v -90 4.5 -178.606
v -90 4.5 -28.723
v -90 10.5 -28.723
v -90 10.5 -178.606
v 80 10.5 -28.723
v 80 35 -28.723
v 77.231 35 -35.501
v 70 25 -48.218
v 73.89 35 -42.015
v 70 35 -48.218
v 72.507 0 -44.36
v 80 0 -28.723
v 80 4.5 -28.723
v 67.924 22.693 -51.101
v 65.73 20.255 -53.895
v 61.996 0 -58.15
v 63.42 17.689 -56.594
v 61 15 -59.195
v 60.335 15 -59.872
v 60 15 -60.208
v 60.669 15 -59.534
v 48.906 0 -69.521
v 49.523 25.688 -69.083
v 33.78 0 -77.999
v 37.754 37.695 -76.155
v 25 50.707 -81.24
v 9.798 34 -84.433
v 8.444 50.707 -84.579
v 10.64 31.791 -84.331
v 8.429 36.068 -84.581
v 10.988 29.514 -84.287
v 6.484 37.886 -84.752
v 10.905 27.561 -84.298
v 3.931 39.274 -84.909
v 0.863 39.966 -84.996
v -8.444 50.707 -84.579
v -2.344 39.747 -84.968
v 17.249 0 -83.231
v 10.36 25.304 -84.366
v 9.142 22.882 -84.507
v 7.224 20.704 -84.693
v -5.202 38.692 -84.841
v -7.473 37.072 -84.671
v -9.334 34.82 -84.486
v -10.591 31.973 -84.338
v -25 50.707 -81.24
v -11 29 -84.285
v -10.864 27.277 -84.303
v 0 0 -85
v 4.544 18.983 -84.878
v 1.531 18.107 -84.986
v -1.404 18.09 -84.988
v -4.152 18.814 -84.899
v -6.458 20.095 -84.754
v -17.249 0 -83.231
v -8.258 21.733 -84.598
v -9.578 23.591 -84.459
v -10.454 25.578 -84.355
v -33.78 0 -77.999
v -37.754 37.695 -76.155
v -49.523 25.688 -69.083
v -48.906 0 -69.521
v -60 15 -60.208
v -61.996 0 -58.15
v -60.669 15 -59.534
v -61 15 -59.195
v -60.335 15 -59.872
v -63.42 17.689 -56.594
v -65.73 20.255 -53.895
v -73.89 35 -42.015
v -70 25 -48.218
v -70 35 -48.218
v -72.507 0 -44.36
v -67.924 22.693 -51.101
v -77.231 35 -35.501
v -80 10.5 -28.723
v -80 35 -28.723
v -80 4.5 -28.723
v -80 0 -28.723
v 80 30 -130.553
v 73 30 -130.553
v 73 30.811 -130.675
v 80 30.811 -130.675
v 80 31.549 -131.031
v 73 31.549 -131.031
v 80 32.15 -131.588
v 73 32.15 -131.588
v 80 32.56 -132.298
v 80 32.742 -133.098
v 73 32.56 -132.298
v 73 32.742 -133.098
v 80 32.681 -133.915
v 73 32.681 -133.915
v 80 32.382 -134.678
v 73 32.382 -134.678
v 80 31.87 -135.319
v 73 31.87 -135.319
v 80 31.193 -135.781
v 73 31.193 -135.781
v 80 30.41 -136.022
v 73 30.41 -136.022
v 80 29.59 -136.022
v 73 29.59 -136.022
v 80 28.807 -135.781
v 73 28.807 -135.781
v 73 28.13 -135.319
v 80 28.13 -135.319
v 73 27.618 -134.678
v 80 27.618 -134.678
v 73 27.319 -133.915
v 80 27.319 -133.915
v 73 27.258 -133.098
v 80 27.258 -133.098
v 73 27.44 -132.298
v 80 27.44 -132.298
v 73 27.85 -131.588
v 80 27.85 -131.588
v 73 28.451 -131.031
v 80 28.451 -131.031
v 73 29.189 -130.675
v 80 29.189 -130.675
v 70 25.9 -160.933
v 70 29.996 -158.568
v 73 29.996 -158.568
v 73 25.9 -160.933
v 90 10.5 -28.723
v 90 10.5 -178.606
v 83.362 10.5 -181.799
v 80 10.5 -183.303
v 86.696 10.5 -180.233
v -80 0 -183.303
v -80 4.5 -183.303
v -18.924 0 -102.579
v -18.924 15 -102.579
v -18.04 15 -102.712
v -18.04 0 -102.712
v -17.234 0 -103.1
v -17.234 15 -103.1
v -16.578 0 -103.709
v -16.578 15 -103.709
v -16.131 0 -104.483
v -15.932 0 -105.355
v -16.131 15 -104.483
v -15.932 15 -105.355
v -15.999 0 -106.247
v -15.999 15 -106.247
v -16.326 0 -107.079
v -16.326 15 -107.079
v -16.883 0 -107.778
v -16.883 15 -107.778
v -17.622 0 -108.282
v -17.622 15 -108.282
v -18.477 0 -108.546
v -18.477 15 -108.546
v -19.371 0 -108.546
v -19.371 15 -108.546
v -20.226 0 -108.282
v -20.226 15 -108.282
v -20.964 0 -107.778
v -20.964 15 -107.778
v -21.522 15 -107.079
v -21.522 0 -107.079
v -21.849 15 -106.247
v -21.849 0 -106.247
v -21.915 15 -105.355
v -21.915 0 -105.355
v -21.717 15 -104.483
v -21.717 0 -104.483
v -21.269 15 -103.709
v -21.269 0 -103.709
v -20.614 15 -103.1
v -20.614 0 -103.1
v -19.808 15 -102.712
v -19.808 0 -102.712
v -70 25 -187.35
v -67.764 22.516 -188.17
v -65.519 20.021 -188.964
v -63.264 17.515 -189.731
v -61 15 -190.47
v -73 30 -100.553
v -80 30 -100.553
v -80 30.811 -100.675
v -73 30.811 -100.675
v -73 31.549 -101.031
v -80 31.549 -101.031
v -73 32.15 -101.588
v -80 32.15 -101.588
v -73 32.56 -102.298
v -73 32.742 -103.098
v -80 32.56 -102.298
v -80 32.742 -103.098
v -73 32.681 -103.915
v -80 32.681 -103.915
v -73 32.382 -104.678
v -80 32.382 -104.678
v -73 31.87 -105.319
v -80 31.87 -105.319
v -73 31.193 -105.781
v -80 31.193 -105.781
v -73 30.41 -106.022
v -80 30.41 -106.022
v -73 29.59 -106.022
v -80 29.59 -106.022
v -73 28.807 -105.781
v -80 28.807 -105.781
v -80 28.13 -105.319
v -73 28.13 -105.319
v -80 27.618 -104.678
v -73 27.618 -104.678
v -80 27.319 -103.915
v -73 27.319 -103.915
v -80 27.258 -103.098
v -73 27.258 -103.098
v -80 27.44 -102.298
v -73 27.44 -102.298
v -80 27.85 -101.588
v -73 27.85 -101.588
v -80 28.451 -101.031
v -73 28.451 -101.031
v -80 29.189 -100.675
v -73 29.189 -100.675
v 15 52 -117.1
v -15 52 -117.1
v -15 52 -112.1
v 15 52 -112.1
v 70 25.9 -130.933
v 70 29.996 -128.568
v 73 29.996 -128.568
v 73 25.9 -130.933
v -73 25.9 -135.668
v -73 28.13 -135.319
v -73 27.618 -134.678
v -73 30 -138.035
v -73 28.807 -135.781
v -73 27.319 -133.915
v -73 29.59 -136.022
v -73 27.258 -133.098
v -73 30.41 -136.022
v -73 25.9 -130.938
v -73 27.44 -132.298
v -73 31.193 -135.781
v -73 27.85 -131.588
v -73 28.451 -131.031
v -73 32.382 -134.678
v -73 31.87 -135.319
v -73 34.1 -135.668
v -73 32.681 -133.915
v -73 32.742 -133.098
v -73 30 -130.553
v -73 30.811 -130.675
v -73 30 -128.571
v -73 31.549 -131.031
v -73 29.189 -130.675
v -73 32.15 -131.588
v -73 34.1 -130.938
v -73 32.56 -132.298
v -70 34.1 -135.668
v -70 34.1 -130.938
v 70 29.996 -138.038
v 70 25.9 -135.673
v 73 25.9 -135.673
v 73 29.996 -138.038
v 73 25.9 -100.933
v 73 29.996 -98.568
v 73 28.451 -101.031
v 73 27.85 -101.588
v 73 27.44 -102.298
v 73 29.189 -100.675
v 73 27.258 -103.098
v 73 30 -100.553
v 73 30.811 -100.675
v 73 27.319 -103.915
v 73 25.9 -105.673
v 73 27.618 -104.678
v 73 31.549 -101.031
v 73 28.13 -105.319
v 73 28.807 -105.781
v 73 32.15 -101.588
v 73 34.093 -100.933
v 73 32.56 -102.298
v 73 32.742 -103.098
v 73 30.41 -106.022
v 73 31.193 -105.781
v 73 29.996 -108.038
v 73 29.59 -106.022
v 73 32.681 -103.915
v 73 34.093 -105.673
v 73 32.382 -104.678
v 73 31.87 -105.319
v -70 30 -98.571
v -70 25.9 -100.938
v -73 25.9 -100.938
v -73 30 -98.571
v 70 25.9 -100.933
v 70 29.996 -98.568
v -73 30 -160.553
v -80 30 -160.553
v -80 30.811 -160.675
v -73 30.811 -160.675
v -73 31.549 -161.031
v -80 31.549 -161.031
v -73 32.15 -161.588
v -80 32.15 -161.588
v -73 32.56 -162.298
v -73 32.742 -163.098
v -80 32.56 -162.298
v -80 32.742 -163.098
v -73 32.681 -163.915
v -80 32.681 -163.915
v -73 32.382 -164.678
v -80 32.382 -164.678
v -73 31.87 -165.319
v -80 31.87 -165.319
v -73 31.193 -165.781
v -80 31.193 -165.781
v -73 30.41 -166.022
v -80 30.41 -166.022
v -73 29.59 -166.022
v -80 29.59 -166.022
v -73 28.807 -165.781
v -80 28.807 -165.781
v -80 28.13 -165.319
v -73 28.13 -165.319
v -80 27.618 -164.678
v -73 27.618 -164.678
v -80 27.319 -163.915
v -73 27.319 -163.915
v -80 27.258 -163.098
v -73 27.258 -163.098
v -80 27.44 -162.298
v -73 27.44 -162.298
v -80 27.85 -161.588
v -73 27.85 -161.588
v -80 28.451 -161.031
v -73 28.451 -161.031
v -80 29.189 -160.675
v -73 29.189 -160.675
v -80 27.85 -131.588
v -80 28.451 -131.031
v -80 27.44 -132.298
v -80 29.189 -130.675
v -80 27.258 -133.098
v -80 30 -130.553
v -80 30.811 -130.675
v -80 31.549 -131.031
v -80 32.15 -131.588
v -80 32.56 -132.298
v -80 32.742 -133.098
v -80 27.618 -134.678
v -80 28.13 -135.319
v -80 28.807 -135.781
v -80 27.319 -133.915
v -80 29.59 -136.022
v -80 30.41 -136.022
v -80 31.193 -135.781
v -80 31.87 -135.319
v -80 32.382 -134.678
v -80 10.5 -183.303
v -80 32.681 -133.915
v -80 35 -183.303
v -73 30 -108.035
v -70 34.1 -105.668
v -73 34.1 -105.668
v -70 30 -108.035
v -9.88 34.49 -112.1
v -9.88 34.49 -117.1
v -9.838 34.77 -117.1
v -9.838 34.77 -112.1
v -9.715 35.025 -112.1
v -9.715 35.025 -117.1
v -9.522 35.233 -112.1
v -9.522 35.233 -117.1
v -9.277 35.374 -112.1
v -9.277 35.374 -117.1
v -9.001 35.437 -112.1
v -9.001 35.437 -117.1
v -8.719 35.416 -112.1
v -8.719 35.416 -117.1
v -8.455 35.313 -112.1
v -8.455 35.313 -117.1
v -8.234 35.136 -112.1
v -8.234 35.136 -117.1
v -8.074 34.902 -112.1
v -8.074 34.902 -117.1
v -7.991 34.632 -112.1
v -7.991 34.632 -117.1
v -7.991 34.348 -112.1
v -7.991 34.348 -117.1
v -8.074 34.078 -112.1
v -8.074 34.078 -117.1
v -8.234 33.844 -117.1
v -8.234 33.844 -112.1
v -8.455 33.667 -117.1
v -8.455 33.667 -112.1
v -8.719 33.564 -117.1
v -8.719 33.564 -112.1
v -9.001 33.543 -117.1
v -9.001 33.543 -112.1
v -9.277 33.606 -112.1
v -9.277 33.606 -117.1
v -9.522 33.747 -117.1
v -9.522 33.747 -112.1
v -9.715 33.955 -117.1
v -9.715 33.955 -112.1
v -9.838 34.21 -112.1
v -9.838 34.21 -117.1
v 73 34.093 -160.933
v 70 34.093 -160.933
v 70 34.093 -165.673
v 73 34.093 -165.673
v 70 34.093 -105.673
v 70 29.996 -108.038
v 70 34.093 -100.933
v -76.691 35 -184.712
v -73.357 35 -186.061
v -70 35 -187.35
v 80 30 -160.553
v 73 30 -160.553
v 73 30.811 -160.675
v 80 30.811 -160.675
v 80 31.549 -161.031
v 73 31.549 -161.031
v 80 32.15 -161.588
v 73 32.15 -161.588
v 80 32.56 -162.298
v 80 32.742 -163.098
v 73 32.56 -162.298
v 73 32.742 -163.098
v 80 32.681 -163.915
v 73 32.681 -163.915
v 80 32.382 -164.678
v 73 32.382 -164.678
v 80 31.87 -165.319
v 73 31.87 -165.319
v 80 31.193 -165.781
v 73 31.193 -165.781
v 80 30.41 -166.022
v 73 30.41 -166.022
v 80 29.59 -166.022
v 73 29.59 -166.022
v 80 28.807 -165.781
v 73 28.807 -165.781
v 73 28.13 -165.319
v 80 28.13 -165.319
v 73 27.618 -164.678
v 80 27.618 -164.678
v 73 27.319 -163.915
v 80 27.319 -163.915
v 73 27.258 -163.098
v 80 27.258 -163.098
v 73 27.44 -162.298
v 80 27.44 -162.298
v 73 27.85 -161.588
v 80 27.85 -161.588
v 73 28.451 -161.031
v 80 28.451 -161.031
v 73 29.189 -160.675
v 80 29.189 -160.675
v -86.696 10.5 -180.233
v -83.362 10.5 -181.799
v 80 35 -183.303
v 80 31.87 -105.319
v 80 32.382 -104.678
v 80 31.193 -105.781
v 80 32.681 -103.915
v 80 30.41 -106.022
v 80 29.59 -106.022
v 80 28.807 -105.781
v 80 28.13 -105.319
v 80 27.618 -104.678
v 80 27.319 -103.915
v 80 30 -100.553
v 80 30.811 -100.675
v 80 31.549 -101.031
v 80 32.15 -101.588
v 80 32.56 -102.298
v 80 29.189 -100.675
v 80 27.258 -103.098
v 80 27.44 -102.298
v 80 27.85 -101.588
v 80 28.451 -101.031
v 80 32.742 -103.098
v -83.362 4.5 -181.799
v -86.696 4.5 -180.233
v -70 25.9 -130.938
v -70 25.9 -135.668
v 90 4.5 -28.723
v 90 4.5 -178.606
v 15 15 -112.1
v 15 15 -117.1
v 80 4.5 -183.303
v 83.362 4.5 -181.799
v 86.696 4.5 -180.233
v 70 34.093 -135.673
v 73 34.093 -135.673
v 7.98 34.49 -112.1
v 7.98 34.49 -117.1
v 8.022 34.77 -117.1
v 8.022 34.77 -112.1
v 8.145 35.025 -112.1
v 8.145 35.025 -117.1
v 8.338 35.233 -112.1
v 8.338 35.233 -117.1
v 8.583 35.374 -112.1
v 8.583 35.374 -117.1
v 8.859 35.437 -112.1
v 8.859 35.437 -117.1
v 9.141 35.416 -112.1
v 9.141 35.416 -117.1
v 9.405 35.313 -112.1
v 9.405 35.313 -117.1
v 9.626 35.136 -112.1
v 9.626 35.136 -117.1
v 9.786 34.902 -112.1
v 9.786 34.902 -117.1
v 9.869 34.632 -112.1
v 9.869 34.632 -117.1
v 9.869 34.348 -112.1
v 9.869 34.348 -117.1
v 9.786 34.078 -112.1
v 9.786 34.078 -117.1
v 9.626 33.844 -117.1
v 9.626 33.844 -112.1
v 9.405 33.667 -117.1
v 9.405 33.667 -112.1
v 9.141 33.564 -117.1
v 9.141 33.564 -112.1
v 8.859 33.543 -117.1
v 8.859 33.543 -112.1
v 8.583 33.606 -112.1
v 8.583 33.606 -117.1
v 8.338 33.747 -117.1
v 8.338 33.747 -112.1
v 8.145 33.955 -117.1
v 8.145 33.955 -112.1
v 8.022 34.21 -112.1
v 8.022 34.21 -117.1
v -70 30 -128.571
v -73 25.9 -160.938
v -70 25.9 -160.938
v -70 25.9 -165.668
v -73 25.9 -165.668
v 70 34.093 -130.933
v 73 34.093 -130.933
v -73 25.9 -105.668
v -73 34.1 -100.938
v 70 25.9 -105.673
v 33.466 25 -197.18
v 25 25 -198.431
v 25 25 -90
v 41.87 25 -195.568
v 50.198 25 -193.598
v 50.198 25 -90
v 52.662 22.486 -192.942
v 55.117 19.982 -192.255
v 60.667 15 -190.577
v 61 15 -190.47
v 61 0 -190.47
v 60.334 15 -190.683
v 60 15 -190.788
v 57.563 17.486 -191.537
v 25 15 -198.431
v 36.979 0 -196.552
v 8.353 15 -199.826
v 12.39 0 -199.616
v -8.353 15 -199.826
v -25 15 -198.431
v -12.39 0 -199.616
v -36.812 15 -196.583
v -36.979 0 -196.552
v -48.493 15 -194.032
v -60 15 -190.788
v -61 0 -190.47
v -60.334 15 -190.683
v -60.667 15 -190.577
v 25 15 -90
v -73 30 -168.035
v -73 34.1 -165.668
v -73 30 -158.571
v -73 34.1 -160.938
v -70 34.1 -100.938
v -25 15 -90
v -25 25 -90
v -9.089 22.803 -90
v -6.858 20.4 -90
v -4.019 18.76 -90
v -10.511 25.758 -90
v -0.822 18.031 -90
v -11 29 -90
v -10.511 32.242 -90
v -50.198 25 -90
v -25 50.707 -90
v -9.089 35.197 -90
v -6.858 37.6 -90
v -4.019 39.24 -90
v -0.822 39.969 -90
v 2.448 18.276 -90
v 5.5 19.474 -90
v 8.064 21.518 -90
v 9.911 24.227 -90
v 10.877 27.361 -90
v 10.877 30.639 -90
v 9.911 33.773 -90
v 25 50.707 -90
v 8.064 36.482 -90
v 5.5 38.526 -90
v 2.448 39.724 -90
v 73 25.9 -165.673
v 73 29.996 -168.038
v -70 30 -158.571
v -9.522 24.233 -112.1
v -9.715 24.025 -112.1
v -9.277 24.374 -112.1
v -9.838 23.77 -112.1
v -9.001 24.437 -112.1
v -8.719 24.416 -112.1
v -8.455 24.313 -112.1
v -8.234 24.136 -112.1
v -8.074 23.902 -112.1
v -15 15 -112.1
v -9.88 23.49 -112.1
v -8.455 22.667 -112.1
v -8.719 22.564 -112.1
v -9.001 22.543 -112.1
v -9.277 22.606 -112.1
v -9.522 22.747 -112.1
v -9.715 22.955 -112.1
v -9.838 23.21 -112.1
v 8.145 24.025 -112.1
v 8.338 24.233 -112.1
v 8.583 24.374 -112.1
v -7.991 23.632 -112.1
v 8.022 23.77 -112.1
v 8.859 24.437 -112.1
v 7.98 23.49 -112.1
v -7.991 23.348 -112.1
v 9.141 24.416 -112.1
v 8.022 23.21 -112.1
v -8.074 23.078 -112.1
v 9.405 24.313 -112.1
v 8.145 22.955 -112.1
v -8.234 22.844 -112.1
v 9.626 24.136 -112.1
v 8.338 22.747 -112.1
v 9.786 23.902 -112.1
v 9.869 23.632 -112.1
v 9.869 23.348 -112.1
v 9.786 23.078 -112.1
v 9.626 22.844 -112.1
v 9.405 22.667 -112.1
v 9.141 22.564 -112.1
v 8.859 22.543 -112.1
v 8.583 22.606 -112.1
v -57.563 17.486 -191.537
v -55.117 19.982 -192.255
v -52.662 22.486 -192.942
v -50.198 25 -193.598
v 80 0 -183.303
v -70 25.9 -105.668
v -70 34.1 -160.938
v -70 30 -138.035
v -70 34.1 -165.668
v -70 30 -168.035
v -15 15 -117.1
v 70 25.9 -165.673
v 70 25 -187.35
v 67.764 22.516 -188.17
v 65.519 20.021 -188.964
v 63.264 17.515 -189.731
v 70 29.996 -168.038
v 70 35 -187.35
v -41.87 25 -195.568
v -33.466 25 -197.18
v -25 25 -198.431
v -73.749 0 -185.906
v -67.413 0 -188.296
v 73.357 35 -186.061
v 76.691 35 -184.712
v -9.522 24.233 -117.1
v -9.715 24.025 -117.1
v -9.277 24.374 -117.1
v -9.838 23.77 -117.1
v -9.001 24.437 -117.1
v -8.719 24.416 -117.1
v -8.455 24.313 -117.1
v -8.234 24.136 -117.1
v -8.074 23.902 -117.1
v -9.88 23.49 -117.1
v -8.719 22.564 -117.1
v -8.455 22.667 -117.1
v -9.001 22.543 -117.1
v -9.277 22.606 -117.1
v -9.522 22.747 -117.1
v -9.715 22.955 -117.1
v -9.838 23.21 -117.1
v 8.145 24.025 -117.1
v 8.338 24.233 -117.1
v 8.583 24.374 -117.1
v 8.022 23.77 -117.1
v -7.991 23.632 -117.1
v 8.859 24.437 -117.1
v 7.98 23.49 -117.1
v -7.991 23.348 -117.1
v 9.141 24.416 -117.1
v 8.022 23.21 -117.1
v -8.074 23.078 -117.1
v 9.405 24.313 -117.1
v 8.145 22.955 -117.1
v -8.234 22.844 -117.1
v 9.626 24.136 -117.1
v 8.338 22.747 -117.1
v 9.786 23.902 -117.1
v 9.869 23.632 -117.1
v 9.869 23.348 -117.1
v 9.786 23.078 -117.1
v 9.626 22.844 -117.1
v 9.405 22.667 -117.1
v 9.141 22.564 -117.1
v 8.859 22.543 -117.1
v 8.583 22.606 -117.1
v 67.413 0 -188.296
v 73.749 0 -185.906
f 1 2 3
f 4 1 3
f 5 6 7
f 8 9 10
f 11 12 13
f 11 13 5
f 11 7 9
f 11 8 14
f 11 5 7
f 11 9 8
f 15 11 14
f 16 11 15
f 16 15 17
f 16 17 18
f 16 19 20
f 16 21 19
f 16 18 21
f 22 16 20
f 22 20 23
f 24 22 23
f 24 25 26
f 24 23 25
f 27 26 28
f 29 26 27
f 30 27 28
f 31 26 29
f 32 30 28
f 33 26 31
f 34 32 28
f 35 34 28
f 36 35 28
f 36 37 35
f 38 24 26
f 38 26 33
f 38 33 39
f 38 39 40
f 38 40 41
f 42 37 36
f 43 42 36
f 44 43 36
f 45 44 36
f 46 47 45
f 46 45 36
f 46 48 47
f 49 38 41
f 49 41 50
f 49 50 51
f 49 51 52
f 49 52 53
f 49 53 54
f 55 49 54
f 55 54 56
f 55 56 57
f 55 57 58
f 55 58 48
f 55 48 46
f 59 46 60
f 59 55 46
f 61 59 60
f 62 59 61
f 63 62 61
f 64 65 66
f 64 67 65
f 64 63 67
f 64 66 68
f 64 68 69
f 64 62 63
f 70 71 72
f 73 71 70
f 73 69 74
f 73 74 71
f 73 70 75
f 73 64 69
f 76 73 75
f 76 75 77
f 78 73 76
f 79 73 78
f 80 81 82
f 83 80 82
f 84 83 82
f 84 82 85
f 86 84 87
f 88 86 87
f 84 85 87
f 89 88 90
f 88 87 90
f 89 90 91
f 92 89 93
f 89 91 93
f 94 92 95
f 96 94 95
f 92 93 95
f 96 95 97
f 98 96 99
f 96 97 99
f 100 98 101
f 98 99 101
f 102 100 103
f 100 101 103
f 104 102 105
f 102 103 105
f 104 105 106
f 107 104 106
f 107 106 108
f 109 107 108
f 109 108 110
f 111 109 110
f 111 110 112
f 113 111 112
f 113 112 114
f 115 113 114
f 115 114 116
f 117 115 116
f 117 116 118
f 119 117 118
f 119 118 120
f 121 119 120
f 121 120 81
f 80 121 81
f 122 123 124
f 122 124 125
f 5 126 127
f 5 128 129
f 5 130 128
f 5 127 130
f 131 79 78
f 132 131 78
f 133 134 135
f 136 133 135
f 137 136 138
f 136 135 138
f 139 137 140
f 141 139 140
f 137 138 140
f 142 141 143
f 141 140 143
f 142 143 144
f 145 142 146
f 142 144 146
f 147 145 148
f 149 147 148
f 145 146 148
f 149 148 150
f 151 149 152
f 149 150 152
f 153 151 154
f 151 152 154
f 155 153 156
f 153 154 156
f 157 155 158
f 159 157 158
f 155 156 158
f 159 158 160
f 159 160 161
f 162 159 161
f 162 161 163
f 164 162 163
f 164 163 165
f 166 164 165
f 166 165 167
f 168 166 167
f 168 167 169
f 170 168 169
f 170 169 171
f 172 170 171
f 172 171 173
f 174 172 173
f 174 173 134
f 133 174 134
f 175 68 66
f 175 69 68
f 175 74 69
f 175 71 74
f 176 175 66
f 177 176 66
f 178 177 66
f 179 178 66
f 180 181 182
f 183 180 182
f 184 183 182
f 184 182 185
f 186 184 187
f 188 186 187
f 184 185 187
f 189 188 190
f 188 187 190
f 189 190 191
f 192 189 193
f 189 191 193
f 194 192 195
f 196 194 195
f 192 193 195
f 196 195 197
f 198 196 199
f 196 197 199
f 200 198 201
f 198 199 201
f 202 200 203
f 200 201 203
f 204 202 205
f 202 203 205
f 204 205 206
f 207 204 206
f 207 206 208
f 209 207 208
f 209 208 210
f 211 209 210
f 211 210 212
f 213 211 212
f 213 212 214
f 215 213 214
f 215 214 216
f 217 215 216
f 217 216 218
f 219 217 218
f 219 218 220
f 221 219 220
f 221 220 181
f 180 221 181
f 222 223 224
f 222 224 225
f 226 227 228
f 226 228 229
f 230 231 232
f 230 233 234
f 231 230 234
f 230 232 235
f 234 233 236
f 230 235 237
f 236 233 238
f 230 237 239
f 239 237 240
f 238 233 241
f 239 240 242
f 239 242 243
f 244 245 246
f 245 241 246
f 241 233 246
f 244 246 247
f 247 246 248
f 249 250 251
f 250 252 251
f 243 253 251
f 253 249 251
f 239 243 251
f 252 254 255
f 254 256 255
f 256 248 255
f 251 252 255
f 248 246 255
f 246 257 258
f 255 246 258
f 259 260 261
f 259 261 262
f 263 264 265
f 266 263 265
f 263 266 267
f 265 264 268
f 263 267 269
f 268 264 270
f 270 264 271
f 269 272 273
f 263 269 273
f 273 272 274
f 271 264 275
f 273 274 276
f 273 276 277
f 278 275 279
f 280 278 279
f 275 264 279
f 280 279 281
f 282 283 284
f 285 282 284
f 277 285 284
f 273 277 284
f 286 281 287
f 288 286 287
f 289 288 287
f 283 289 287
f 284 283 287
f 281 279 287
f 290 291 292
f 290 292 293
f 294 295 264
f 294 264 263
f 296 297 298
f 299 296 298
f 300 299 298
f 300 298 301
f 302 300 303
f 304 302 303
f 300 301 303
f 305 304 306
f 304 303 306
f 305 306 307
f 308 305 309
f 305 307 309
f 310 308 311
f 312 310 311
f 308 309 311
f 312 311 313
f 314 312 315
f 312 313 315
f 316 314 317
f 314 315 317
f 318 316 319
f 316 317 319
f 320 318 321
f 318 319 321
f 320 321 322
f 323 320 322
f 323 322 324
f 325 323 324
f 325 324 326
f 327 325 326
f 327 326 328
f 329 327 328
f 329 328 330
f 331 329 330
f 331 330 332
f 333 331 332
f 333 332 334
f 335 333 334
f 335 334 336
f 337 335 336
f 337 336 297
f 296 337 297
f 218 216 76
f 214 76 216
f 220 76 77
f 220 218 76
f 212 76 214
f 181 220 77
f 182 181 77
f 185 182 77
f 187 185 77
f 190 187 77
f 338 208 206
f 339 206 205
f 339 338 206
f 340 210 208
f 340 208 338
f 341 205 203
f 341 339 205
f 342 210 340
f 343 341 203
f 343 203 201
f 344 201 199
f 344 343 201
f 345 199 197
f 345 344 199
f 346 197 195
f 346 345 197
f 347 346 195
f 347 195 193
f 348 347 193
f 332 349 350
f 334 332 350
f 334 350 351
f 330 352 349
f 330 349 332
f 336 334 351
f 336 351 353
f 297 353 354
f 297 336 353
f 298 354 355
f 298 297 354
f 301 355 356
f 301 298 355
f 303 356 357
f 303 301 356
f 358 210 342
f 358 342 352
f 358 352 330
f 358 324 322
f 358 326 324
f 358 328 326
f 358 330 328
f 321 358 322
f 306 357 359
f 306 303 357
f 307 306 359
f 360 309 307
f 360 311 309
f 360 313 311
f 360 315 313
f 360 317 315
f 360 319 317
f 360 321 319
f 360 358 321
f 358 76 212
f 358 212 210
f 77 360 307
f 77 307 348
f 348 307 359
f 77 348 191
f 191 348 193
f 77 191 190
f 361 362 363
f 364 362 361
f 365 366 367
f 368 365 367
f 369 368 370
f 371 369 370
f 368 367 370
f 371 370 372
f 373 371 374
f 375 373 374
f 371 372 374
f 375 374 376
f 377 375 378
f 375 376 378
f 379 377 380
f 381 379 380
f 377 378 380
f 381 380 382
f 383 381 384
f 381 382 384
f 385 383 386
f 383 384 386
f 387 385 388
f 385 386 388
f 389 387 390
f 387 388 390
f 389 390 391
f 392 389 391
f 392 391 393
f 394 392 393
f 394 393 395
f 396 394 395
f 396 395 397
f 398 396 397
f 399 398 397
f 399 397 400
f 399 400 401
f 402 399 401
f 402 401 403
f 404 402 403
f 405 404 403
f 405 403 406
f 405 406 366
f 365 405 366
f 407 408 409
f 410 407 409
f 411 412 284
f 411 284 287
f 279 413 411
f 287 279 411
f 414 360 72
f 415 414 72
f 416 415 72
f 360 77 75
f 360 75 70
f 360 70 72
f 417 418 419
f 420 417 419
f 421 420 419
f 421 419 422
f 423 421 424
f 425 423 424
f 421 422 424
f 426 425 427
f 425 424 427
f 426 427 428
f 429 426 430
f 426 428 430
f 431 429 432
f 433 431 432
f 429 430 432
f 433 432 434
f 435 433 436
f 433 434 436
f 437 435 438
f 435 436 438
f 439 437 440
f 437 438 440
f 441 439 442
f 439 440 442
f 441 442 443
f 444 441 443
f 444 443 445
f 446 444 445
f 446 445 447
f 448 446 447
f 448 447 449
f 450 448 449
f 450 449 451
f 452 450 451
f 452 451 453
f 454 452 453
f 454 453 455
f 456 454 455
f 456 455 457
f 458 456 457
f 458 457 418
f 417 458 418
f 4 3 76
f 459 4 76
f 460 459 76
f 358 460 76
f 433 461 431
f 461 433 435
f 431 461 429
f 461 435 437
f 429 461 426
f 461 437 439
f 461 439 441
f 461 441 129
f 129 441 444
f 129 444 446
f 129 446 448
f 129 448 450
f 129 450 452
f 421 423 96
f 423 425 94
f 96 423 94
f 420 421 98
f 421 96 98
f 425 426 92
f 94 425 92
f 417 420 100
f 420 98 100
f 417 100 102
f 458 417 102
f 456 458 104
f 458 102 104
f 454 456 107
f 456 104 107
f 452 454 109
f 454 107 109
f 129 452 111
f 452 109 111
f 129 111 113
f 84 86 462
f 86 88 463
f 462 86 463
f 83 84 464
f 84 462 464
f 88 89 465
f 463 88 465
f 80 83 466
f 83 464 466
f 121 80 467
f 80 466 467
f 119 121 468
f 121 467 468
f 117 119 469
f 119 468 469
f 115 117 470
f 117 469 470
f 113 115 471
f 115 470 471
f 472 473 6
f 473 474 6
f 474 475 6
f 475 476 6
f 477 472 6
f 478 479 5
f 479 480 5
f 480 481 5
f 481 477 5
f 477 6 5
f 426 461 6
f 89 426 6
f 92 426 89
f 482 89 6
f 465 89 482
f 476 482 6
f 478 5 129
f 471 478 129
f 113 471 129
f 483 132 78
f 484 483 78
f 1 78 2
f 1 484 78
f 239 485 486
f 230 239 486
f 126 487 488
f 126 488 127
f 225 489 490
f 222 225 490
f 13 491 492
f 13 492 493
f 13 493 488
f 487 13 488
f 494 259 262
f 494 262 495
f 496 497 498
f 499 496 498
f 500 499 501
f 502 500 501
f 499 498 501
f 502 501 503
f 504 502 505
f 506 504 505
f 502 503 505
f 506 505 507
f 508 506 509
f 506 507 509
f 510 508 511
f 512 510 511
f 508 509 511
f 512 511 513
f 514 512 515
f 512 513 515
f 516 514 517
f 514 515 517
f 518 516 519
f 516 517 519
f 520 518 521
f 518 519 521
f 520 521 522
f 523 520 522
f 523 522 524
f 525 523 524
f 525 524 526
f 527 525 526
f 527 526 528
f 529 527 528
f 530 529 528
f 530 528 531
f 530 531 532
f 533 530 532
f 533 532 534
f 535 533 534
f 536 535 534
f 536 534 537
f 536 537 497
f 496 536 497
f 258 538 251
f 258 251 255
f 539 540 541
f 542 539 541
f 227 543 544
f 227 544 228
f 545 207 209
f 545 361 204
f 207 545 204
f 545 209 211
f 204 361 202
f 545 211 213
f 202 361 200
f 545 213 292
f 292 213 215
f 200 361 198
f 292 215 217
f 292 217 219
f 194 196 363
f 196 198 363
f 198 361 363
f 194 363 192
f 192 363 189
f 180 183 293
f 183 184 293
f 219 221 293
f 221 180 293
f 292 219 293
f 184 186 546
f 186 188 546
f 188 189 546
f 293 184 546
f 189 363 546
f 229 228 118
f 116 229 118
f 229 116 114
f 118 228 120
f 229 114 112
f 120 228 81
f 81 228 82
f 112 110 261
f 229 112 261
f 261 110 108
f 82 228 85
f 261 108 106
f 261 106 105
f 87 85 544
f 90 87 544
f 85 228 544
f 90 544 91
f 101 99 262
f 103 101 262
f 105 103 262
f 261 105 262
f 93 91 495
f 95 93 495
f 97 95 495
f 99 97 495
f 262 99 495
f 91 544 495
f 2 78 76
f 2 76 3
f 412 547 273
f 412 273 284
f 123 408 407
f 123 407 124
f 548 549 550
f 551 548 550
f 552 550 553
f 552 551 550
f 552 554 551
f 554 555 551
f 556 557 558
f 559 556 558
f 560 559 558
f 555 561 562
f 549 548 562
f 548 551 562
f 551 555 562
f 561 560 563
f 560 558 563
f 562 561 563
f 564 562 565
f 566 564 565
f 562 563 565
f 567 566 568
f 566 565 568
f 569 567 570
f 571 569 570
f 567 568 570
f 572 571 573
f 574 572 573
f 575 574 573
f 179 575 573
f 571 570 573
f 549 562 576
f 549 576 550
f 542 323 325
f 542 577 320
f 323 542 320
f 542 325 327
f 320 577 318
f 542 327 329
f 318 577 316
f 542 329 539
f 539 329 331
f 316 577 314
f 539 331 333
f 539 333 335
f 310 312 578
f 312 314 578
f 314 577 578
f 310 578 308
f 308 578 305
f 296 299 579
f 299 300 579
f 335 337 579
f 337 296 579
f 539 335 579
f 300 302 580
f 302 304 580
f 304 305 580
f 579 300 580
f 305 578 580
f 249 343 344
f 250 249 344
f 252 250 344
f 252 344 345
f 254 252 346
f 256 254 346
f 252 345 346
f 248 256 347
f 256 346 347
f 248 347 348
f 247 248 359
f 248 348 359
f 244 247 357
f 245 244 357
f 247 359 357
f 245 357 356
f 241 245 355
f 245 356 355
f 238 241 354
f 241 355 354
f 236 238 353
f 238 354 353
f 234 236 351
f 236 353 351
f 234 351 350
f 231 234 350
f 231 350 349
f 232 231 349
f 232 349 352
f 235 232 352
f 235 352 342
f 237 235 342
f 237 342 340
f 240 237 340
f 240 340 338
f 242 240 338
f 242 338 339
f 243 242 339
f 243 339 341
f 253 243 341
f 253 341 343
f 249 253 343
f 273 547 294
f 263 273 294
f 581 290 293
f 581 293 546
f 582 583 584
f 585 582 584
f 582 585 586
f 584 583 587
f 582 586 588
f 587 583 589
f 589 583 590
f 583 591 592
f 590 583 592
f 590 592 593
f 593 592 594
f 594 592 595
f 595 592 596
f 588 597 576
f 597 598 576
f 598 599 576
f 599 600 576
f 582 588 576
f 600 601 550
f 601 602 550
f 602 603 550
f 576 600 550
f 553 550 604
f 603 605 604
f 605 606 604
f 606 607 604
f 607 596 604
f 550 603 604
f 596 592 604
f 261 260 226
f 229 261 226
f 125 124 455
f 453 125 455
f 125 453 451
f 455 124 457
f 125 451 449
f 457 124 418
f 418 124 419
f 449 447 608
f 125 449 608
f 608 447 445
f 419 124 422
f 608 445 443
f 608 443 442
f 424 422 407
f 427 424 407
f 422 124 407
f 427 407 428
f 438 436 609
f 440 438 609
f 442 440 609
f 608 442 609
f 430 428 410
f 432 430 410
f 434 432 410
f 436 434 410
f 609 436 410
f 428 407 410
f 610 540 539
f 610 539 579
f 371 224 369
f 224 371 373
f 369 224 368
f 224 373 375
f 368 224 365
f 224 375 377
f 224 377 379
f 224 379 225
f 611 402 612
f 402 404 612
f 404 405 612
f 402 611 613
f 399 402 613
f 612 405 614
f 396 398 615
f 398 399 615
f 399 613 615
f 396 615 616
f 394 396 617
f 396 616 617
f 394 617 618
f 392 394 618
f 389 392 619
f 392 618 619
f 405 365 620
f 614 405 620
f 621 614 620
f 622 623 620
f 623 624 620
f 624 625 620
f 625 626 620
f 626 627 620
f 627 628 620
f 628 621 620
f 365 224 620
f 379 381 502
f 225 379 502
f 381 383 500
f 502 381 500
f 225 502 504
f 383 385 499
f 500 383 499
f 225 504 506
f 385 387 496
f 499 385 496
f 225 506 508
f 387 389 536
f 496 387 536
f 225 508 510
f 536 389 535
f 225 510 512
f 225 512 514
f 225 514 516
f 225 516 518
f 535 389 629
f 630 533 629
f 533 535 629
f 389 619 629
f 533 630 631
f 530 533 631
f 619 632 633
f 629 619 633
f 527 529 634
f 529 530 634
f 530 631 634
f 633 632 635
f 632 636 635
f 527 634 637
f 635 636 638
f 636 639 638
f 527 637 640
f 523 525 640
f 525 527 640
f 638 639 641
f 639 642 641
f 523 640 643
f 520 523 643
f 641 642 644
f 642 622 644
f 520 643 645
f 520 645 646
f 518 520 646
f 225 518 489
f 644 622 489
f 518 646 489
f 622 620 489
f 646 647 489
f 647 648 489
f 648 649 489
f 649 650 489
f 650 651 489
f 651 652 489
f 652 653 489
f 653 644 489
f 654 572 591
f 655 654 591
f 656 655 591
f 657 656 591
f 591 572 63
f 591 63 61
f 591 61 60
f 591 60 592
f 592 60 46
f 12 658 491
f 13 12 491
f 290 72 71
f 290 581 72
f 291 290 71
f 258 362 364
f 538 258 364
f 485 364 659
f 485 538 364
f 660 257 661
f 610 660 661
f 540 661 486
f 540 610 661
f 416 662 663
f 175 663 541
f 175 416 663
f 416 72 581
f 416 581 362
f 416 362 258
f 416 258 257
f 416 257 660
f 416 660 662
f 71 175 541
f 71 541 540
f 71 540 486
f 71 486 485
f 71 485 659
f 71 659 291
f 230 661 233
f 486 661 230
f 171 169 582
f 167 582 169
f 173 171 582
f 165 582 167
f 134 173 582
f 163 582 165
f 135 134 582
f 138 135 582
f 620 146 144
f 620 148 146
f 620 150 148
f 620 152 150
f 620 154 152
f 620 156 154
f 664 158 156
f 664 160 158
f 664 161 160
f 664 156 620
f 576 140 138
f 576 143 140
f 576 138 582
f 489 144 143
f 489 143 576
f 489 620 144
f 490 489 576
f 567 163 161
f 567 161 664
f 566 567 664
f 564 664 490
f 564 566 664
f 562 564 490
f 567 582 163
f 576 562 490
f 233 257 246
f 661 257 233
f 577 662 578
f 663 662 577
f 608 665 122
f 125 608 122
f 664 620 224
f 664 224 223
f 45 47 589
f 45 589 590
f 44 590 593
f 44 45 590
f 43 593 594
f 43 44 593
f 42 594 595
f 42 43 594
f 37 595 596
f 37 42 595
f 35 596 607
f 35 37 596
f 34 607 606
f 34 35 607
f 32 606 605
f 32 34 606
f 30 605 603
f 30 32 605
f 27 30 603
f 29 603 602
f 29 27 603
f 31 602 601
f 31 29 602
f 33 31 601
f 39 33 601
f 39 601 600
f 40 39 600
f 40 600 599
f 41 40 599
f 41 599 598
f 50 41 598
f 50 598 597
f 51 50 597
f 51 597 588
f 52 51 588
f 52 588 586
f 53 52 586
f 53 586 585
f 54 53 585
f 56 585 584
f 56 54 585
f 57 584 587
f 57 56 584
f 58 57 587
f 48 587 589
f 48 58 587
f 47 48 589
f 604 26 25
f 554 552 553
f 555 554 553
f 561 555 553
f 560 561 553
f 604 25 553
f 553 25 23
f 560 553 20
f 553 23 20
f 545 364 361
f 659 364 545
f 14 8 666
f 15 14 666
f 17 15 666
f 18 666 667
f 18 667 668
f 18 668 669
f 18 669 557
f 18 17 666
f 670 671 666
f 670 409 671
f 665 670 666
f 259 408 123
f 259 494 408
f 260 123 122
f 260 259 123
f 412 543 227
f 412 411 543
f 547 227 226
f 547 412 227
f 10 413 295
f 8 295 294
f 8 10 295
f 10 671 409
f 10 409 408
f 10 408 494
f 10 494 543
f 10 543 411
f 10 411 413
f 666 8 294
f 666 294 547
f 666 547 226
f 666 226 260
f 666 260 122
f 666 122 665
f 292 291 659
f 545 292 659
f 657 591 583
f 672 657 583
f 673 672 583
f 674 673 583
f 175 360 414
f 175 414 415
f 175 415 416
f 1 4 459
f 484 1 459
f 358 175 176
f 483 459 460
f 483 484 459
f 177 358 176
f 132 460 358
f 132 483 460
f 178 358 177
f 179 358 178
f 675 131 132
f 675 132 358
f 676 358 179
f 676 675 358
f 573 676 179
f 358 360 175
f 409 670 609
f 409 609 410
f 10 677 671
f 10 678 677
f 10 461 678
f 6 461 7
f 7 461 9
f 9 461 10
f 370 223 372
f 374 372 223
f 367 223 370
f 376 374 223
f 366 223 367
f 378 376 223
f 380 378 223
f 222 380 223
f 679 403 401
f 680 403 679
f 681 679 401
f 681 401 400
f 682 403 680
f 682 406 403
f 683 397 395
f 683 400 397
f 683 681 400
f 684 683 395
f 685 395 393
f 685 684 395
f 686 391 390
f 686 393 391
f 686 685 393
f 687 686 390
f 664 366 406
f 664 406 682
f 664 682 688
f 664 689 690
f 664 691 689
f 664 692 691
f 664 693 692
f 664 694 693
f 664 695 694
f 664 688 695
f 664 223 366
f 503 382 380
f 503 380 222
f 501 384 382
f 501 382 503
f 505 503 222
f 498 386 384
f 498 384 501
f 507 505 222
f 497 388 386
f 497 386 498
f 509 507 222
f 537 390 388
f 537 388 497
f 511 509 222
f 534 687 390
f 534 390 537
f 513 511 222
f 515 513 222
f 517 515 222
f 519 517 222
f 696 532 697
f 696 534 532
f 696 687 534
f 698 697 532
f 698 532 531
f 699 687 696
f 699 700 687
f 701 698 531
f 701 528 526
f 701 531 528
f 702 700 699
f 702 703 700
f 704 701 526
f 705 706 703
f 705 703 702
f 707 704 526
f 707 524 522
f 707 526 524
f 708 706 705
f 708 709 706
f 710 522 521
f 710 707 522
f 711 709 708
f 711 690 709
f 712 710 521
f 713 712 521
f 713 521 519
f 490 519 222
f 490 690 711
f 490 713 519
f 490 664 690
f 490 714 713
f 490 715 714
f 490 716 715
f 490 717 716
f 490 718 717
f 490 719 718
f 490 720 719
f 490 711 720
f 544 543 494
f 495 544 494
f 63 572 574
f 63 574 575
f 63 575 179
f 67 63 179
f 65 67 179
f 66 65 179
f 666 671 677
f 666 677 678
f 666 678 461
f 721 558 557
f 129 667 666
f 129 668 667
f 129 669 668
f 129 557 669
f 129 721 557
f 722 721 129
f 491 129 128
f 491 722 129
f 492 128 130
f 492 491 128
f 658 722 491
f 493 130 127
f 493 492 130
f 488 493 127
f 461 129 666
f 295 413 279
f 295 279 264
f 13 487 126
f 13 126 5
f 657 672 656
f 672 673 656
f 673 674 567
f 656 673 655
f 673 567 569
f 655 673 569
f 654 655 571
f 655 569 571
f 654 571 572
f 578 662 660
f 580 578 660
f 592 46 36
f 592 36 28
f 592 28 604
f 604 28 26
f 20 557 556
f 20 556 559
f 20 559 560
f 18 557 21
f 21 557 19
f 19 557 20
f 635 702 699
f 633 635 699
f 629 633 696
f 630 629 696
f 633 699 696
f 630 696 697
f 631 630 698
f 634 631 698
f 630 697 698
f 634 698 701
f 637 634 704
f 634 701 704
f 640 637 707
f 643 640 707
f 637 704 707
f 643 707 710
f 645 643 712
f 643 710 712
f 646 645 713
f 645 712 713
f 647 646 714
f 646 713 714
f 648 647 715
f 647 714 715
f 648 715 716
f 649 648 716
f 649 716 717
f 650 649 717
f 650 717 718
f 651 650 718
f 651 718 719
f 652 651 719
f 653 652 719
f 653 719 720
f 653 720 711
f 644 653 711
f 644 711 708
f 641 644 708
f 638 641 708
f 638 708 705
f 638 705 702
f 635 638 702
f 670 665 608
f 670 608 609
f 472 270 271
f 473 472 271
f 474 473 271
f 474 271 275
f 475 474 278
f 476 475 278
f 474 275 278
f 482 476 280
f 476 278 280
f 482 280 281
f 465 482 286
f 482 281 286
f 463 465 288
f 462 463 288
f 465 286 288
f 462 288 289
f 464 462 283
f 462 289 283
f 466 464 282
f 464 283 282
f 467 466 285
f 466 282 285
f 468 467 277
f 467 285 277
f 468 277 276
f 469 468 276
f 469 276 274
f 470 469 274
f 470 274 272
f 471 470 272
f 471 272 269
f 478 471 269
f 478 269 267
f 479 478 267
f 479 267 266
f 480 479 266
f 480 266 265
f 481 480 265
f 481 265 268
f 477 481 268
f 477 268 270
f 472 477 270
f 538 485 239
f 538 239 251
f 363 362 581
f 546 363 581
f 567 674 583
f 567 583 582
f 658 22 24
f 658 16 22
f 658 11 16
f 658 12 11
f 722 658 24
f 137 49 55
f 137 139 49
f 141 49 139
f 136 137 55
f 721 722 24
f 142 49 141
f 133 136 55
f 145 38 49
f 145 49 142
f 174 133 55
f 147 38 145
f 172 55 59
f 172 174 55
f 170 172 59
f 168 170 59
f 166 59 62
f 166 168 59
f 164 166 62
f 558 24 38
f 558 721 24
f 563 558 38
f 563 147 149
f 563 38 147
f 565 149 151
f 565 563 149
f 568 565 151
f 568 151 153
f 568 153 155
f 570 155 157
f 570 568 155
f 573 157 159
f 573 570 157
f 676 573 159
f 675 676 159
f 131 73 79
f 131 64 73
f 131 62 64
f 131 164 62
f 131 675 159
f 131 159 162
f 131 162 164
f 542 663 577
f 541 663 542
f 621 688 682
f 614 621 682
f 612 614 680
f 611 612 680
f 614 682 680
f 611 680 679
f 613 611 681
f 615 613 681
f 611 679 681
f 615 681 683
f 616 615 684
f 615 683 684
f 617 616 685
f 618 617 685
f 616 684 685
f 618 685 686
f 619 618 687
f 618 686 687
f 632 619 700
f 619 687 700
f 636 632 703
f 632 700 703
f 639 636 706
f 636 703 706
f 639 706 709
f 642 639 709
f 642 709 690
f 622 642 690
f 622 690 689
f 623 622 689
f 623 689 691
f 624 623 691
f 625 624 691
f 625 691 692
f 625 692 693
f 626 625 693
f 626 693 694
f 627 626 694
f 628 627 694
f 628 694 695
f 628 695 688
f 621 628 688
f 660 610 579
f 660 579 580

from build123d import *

# Parameters (mm, degrees)
SKETCH1_R                = 200
BOSS_EXTRUDE1_DEPTH      = 15
BOSS_EXTRUDE2_DEPTH      = 200
CUT_EXTRUDE1_DEPTH       = 286.087705803
CUT_EXTRUDE1_DEPTH_BACK  = 286.087705803
SKETCH3_R                = 85
CUT_EXTRUDE2_DEPTH       = 451.079120005
CUT_EXTRUDE2_DEPTH_BACK  = 451.079120005
SKETCH4_R                = 11
CUT_EXTRUDE3_DEPTH       = 451.079120105
CUT_EXTRUDE3_DEPTH_BACK  = 110
CUT_EXTRUDE4_DEPTH       = 110
BOSS_EXTRUDE3_DEPTH      = 200
CUT_EXTRUDE5_DEPTH       = 286.087705815
CUT_EXTRUDE5_DEPTH_BACK  = 286.087705815
SKETCH7_OUTSIDE_W        = 515.59
SKETCH7_OUTSIDE_H        = 515.59
SKETCH7_OUTSIDE_R        = 200
SKETCH9_R                = 4
BOSS_EXTRUDE4_DEPTH      = 220
CUT_EXTRUDE6_DEPTH       = 190
SKETCH11_R               = 3
CUT_EXTRUDE7_DEPTH       = 486.974499745
CUT_EXTRUDE8_DEPTH       = 302.61434707
CUT_EXTRUDE8_DEPTH_BACK  = 302.61434707
BOSS_EXTRUDE5_DEPTH      = 150
CUT_EXTRUDE9_DEPTH       = 262.287608345
CUT_EXTRUDE9_DEPTH_BACK  = 262.287608345
CUT_EXTRUDE10_DEPTH      = 259.795285906
CUT_EXTRUDE10_DEPTH_BACK = 259.795285906
SKETCH18_R               = 85
CUT_EXTRUDE11_START      = -15
CUT_EXTRUDE11_DEPTH      = 35
SKETCH20_R               = 2.75
CUT_EXTRUDE12_DEPTH      = 268.341007469
SKETCH21_W               = 30
SKETCH21_H               = 5
BOSS_EXTRUDE6_DEPTH      = 37
SKETCH22_R               = 0.95
CUT_EXTRUDE13_DEPTH      = 10
CUT_EXTRUDE14_DEPTH      = 3
LPATTERN1_COUNT          = 3
LPATTERN1_PITCH          = 30
CUT_EXTRUDE15_DEPTH      = 3
LPATTERN2_COUNT          = 3
LPATTERN2_PITCH          = 30
SKETCH25_R               = 3
CUT_EXTRUDE16_DEPTH      = 30


# Read off the part's stored shape, not the designer's step: Cut-Extrude11
with BuildPart() as part:
    # Sketch1 → Boss-Extrude1 (new body)
    with BuildSketch(Plane(origin=(0, 0, 0), x_dir=(1, 0, 0), z_dir=(0, 1, 0))):
        with Locations(Location((0, 0, 0), (0, 0, 270))):
            Circle(SKETCH1_R)
    extrude(amount=BOSS_EXTRUDE1_DEPTH)

    # Sketch2 → Boss-Extrude2 (add, symmetric)
    with BuildSketch(Plane.XY):
        Polygon((-25, 50.707142143), (25, 50.707142143), (60, 15), (-60, 15), align=None)
    extrude(amount=BOSS_EXTRUDE2_DEPTH, both=True)

    # Sketch3 → Cut-Extrude1 (cut, two sides: drawn at the far end of the back side and taken through both)
    with BuildSketch(Plane(origin=(0, 15, 0), x_dir=(1, 0, 0), z_dir=(0, 1, 0)).offset(-CUT_EXTRUDE1_DEPTH_BACK)):
        with Locations(Location((0, 0, 0), (0, 0, 270))):
            Circle(SKETCH3_R)
    extrude(amount=CUT_EXTRUDE1_DEPTH + CUT_EXTRUDE1_DEPTH_BACK, mode=Mode.SUBTRACT)

    # Sketch4 → Cut-Extrude2 (cut, two sides: drawn at the far end of the back side and taken through both)
    with BuildSketch(Plane(origin=(0, 0, -200), x_dir=(-1, 0, 0), z_dir=(0, 0, -1)).offset(-CUT_EXTRUDE2_DEPTH_BACK)):
        with Locations((0, 29)):
            Circle(SKETCH4_R)
    extrude(amount=CUT_EXTRUDE2_DEPTH + CUT_EXTRUDE2_DEPTH_BACK, mode=Mode.SUBTRACT)

    # Sketch5 → Cut-Extrude3 (cut, two sides: drawn at the far end of the back side and taken through both)
    with BuildSketch(Plane.XY.offset(200).offset(-CUT_EXTRUDE3_DEPTH_BACK)):
        Polygon((-25, 50.707142143), (25, 50.707142143), (50.198039412, 25), (25, 25), (25, 15), (-25, 15), (-25, 25), (-50.198039412, 25), align=None)
    extrude(amount=CUT_EXTRUDE3_DEPTH + CUT_EXTRUDE3_DEPTH_BACK, mode=Mode.SUBTRACT)

    # Sketch6 → Cut-Extrude4 (cut)
    with BuildSketch(Plane(origin=(0, 0, -200), x_dir=(-1, 0, 0), z_dir=(0, 0, -1))):
        Polygon((-25, 50.707142143), (25, 50.707142143), (50.198039412, 25), (25, 25), (25, 15), (-25, 15), (-25, 25), (-50.198039412, 25), align=None)
    extrude(amount=-CUT_EXTRUDE4_DEPTH, mode=Mode.SUBTRACT)

    # Sketch8 → Boss-Extrude3 (add, symmetric)
    with BuildSketch(Plane(origin=(0, 0, 0), x_dir=(0, 0, -1), z_dir=(1, 0, 0))):
        Polygon((0, 15), (-20, 15), (-10, 35.712315177), (10, 35.712315177), (20, 15), align=None)
    extrude(amount=BOSS_EXTRUDE3_DEPTH, both=True)

    # Sketch7 outside → Cut-Extrude5 (cut, two sides: drawn at the far end of the back side and taken through both)
    with BuildSketch(Plane(origin=(0, 15, 0), x_dir=(1, 0, 0), z_dir=(0, 1, 0)).offset(-CUT_EXTRUDE5_DEPTH_BACK)):
        Rectangle(SKETCH7_OUTSIDE_W, SKETCH7_OUTSIDE_H)
        with Locations(Location((0, 0, 0), (0, 0, 97.180755781))):
            Circle(SKETCH7_OUTSIDE_R, mode=Mode.SUBTRACT)
    extrude(amount=CUT_EXTRUDE5_DEPTH + CUT_EXTRUDE5_DEPTH_BACK, mode=Mode.SUBTRACT)

    # Sketch9 → Boss-Extrude4 (add, symmetric)
    with BuildSketch(Plane(origin=(0, 0, 0), x_dir=(0, 0, -1), z_dir=(1, 0, 0))):
        with Locations(Location((0, 29, 0), (0, 0, 180))):
            Circle(SKETCH9_R)
    extrude(amount=BOSS_EXTRUDE4_DEPTH, both=True)

    # Sketch10 → Cut-Extrude6 (cut, symmetric)
    with BuildSketch(Plane(origin=(0, 0, 0), x_dir=(0, 0, -1), z_dir=(1, 0, 0))):
        Polygon((-20, 15), (20, 15), (10, 35.712315177), (-10, 35.712315177), align=None)
    extrude(amount=CUT_EXTRUDE6_DEPTH, both=True, mode=Mode.SUBTRACT)

    # Sketch11 → Cut-Extrude7 (cut, through all)
    with BuildSketch(Plane.ZY.offset(220)):
        with Locations((0, 29)):
            Circle(SKETCH11_R)
    extrude(amount=-CUT_EXTRUDE7_DEPTH, mode=Mode.SUBTRACT)

    # Sketch14 → Cut-Extrude8 (cut, two sides: drawn at the far end of the back side and taken through both)
    with BuildSketch(Plane(origin=(0, 0, 0), x_dir=(1, 0, 0), z_dir=(0, 1, 0)).offset(-CUT_EXTRUDE8_DEPTH_BACK)):
        Polygon((-80, 28.722813233), (-80, 204.683452683), (-270.013244013, 28.722813233), (-103.583737584, -216.10995611), (187.046893047, -216.10995611), (266.535612536, 150.034958035), (80, 209.154693155), (80, 28.722813233), align=None)
    extrude(amount=CUT_EXTRUDE8_DEPTH + CUT_EXTRUDE8_DEPTH_BACK, mode=Mode.SUBTRACT)

    # Sketch16 → Boss-Extrude5 (add, symmetric)
    with BuildSketch(Plane(origin=(0, 0, -90), x_dir=(-1, 0, 0), z_dir=(0, 0, -1))):
        Polygon((-80, 15), (-80, 35), (-70, 35), (-70, 25), (-61, 15), (-61, 0), (-80, 0), (-80, 4.5), (-90, 4.5), (-90, 10.5), (-80, 10.5), align=None)
        Polygon((80, 15), (80, 35), (70, 35), (70, 25), (61, 15), (61, 0), (80, 0), (80, 4.5), (90, 4.5), (90, 10.5), (80, 10.5), align=None)
    extrude(amount=BOSS_EXTRUDE5_DEPTH, both=True)

    # Sketch17 → Cut-Extrude9 (cut, two sides: drawn at the far end of the back side and taken through both)
    with BuildSketch(Plane(origin=(0, 0, 0), x_dir=(1, 0, 0), z_dir=(0, 1, 0)).offset(-CUT_EXTRUDE9_DEPTH_BACK)):
        Polygon((-80, 28.722813233), (-99.608008808, 28.722813233), (-99.608008808, -74.271563426), (112.245925984, -74.271563426), (112.245925984, 0), (109.222119936, 28.722813233), (80, 28.722813233), align=None)
    extrude(amount=CUT_EXTRUDE9_DEPTH + CUT_EXTRUDE9_DEPTH_BACK, mode=Mode.SUBTRACT)

    # Sketch18 → Cut-Extrude10 (cut, two sides: drawn at the far end of the back side and taken through both)
    with BuildSketch(Plane(origin=(0, 15, 0), x_dir=(1, 0, 0), z_dir=(0, 1, 0)).offset(-CUT_EXTRUDE10_DEPTH_BACK)):
        Circle(SKETCH18_R)
    extrude(amount=CUT_EXTRUDE10_DEPTH + CUT_EXTRUDE10_DEPTH_BACK, mode=Mode.SUBTRACT)

    # Cut-Extrude11 outline → Cut-Extrude11 (cut)
    with BuildSketch(Plane(origin=(0, 15, 0), x_dir=(1, 0, 0), z_dir=(0, 1, 0)).offset(CUT_EXTRUDE11_START)):
        with BuildLine():
            Line((61, 240), (61, 190.470470152))
            ThreePointArc((61, 190.470470152), (75.732708439, 185.106879593), (90, 178.605710995))
            Line((90, 178.605710995), (90, 240))
            Line((90, 240), (61, 240))
        make_face()
        with BuildLine():
            Line((-61, 190.470470152), (-61, 240))
            Line((-61, 240), (-90, 240))
            Line((-90, 240), (-90, 178.605710995))
            ThreePointArc((-90, 178.605710995), (-75.732708439, 185.106879593), (-61, 190.470470152))
        make_face()
    extrude(amount=CUT_EXTRUDE11_DEPTH, mode=Mode.SUBTRACT)

    # Sketch20 → Cut-Extrude12 (cut, through all)
    with BuildSketch(Plane.ZY.offset(80)):
        with Locations((-163.303027798, 30)):
            Circle(SKETCH20_R)
        with Locations((-103.303027798, 30)):
            Circle(SKETCH20_R)
        with Locations((-133.303027798, 30)):
            Circle(SKETCH20_R)
    extrude(amount=-CUT_EXTRUDE12_DEPTH, mode=Mode.SUBTRACT)

    # Sketch21 → Boss-Extrude6 (add)
    with BuildSketch(Plane(origin=(0, 15, 0), x_dir=(1, 0, 0), z_dir=(0, 1, 0))):
        with Locations((0, 114.6)):
            Rectangle(SKETCH21_W, SKETCH21_H)
    extrude(amount=BOSS_EXTRUDE6_DEPTH)

    # Sketch22 → Cut-Extrude13 (cut)
    with BuildSketch(Plane(origin=(0, 0, -117.1), x_dir=(-1, 0, 0), z_dir=(0, 0, -1))):
        with Locations((-8.93, 23.49)):
            Circle(SKETCH22_R)
        with Locations((8.93, 23.49)):
            Circle(SKETCH22_R)
        with Locations((8.93, 34.49)):
            Circle(SKETCH22_R)
        with Locations((-8.93, 34.49)):
            Circle(SKETCH22_R)
    extrude(amount=-CUT_EXTRUDE13_DEPTH, mode=Mode.SUBTRACT)

    # Sketch23 → Cut-Extrude14 (cut)
    with BuildSketch(Plane(origin=(-70, 0, 0), x_dir=(0, 0, -1), z_dir=(1, 0, 0))):
        Polygon((103.303027798, 34.1), (105.668027798, 34.1), (108.035163902, 30), (105.668027798, 25.9), (103.303027798, 25.9), (100.938027798, 25.9), (98.570891695, 30), (100.938027798, 34.1), align=None)
    cut_extrude14 = extrude(amount=-CUT_EXTRUDE14_DEPTH, mode=Mode.SUBTRACT)

    # LPattern1: Cut-Extrude14 ×3
    with Locations(*[(0, 0, -i * LPATTERN1_PITCH) for i in range(1, LPATTERN1_COUNT)]):
        add(cut_extrude14, mode=Mode.SUBTRACT)

    # Sketch24 → Cut-Extrude15 (cut)
    with BuildSketch(Plane.ZY.offset(-70)):
        Polygon((-163.303027798, 34.09260032), (-160.933027798, 34.09260032), (-158.568027798, 29.99630016), (-160.933027798, 25.9), (-163.303027798, 25.9), (-165.673027798, 25.9), (-168.038027798, 29.99630016), (-165.673027798, 34.09260032), align=None)
    cut_extrude15 = extrude(amount=-CUT_EXTRUDE15_DEPTH, mode=Mode.SUBTRACT)

    # LPattern2: Cut-Extrude15 ×3
    with Locations(*[(0, 0, i * LPATTERN2_PITCH) for i in range(1, LPATTERN2_COUNT)]):
        add(cut_extrude15, mode=Mode.SUBTRACT)

    # Sketch25 → Cut-Extrude16 (cut)
    with BuildSketch(Plane(origin=(0, 15, 0), x_dir=(1, 0, 0), z_dir=(0, 1, 0))):
        with Locations(Location((-18.923887281, 105.579050088, 0), (0, 0, 270))):
            Circle(SKETCH25_R)
    extrude(amount=-CUT_EXTRUDE16_DEPTH, mode=Mode.SUBTRACT)


solid = part.part
